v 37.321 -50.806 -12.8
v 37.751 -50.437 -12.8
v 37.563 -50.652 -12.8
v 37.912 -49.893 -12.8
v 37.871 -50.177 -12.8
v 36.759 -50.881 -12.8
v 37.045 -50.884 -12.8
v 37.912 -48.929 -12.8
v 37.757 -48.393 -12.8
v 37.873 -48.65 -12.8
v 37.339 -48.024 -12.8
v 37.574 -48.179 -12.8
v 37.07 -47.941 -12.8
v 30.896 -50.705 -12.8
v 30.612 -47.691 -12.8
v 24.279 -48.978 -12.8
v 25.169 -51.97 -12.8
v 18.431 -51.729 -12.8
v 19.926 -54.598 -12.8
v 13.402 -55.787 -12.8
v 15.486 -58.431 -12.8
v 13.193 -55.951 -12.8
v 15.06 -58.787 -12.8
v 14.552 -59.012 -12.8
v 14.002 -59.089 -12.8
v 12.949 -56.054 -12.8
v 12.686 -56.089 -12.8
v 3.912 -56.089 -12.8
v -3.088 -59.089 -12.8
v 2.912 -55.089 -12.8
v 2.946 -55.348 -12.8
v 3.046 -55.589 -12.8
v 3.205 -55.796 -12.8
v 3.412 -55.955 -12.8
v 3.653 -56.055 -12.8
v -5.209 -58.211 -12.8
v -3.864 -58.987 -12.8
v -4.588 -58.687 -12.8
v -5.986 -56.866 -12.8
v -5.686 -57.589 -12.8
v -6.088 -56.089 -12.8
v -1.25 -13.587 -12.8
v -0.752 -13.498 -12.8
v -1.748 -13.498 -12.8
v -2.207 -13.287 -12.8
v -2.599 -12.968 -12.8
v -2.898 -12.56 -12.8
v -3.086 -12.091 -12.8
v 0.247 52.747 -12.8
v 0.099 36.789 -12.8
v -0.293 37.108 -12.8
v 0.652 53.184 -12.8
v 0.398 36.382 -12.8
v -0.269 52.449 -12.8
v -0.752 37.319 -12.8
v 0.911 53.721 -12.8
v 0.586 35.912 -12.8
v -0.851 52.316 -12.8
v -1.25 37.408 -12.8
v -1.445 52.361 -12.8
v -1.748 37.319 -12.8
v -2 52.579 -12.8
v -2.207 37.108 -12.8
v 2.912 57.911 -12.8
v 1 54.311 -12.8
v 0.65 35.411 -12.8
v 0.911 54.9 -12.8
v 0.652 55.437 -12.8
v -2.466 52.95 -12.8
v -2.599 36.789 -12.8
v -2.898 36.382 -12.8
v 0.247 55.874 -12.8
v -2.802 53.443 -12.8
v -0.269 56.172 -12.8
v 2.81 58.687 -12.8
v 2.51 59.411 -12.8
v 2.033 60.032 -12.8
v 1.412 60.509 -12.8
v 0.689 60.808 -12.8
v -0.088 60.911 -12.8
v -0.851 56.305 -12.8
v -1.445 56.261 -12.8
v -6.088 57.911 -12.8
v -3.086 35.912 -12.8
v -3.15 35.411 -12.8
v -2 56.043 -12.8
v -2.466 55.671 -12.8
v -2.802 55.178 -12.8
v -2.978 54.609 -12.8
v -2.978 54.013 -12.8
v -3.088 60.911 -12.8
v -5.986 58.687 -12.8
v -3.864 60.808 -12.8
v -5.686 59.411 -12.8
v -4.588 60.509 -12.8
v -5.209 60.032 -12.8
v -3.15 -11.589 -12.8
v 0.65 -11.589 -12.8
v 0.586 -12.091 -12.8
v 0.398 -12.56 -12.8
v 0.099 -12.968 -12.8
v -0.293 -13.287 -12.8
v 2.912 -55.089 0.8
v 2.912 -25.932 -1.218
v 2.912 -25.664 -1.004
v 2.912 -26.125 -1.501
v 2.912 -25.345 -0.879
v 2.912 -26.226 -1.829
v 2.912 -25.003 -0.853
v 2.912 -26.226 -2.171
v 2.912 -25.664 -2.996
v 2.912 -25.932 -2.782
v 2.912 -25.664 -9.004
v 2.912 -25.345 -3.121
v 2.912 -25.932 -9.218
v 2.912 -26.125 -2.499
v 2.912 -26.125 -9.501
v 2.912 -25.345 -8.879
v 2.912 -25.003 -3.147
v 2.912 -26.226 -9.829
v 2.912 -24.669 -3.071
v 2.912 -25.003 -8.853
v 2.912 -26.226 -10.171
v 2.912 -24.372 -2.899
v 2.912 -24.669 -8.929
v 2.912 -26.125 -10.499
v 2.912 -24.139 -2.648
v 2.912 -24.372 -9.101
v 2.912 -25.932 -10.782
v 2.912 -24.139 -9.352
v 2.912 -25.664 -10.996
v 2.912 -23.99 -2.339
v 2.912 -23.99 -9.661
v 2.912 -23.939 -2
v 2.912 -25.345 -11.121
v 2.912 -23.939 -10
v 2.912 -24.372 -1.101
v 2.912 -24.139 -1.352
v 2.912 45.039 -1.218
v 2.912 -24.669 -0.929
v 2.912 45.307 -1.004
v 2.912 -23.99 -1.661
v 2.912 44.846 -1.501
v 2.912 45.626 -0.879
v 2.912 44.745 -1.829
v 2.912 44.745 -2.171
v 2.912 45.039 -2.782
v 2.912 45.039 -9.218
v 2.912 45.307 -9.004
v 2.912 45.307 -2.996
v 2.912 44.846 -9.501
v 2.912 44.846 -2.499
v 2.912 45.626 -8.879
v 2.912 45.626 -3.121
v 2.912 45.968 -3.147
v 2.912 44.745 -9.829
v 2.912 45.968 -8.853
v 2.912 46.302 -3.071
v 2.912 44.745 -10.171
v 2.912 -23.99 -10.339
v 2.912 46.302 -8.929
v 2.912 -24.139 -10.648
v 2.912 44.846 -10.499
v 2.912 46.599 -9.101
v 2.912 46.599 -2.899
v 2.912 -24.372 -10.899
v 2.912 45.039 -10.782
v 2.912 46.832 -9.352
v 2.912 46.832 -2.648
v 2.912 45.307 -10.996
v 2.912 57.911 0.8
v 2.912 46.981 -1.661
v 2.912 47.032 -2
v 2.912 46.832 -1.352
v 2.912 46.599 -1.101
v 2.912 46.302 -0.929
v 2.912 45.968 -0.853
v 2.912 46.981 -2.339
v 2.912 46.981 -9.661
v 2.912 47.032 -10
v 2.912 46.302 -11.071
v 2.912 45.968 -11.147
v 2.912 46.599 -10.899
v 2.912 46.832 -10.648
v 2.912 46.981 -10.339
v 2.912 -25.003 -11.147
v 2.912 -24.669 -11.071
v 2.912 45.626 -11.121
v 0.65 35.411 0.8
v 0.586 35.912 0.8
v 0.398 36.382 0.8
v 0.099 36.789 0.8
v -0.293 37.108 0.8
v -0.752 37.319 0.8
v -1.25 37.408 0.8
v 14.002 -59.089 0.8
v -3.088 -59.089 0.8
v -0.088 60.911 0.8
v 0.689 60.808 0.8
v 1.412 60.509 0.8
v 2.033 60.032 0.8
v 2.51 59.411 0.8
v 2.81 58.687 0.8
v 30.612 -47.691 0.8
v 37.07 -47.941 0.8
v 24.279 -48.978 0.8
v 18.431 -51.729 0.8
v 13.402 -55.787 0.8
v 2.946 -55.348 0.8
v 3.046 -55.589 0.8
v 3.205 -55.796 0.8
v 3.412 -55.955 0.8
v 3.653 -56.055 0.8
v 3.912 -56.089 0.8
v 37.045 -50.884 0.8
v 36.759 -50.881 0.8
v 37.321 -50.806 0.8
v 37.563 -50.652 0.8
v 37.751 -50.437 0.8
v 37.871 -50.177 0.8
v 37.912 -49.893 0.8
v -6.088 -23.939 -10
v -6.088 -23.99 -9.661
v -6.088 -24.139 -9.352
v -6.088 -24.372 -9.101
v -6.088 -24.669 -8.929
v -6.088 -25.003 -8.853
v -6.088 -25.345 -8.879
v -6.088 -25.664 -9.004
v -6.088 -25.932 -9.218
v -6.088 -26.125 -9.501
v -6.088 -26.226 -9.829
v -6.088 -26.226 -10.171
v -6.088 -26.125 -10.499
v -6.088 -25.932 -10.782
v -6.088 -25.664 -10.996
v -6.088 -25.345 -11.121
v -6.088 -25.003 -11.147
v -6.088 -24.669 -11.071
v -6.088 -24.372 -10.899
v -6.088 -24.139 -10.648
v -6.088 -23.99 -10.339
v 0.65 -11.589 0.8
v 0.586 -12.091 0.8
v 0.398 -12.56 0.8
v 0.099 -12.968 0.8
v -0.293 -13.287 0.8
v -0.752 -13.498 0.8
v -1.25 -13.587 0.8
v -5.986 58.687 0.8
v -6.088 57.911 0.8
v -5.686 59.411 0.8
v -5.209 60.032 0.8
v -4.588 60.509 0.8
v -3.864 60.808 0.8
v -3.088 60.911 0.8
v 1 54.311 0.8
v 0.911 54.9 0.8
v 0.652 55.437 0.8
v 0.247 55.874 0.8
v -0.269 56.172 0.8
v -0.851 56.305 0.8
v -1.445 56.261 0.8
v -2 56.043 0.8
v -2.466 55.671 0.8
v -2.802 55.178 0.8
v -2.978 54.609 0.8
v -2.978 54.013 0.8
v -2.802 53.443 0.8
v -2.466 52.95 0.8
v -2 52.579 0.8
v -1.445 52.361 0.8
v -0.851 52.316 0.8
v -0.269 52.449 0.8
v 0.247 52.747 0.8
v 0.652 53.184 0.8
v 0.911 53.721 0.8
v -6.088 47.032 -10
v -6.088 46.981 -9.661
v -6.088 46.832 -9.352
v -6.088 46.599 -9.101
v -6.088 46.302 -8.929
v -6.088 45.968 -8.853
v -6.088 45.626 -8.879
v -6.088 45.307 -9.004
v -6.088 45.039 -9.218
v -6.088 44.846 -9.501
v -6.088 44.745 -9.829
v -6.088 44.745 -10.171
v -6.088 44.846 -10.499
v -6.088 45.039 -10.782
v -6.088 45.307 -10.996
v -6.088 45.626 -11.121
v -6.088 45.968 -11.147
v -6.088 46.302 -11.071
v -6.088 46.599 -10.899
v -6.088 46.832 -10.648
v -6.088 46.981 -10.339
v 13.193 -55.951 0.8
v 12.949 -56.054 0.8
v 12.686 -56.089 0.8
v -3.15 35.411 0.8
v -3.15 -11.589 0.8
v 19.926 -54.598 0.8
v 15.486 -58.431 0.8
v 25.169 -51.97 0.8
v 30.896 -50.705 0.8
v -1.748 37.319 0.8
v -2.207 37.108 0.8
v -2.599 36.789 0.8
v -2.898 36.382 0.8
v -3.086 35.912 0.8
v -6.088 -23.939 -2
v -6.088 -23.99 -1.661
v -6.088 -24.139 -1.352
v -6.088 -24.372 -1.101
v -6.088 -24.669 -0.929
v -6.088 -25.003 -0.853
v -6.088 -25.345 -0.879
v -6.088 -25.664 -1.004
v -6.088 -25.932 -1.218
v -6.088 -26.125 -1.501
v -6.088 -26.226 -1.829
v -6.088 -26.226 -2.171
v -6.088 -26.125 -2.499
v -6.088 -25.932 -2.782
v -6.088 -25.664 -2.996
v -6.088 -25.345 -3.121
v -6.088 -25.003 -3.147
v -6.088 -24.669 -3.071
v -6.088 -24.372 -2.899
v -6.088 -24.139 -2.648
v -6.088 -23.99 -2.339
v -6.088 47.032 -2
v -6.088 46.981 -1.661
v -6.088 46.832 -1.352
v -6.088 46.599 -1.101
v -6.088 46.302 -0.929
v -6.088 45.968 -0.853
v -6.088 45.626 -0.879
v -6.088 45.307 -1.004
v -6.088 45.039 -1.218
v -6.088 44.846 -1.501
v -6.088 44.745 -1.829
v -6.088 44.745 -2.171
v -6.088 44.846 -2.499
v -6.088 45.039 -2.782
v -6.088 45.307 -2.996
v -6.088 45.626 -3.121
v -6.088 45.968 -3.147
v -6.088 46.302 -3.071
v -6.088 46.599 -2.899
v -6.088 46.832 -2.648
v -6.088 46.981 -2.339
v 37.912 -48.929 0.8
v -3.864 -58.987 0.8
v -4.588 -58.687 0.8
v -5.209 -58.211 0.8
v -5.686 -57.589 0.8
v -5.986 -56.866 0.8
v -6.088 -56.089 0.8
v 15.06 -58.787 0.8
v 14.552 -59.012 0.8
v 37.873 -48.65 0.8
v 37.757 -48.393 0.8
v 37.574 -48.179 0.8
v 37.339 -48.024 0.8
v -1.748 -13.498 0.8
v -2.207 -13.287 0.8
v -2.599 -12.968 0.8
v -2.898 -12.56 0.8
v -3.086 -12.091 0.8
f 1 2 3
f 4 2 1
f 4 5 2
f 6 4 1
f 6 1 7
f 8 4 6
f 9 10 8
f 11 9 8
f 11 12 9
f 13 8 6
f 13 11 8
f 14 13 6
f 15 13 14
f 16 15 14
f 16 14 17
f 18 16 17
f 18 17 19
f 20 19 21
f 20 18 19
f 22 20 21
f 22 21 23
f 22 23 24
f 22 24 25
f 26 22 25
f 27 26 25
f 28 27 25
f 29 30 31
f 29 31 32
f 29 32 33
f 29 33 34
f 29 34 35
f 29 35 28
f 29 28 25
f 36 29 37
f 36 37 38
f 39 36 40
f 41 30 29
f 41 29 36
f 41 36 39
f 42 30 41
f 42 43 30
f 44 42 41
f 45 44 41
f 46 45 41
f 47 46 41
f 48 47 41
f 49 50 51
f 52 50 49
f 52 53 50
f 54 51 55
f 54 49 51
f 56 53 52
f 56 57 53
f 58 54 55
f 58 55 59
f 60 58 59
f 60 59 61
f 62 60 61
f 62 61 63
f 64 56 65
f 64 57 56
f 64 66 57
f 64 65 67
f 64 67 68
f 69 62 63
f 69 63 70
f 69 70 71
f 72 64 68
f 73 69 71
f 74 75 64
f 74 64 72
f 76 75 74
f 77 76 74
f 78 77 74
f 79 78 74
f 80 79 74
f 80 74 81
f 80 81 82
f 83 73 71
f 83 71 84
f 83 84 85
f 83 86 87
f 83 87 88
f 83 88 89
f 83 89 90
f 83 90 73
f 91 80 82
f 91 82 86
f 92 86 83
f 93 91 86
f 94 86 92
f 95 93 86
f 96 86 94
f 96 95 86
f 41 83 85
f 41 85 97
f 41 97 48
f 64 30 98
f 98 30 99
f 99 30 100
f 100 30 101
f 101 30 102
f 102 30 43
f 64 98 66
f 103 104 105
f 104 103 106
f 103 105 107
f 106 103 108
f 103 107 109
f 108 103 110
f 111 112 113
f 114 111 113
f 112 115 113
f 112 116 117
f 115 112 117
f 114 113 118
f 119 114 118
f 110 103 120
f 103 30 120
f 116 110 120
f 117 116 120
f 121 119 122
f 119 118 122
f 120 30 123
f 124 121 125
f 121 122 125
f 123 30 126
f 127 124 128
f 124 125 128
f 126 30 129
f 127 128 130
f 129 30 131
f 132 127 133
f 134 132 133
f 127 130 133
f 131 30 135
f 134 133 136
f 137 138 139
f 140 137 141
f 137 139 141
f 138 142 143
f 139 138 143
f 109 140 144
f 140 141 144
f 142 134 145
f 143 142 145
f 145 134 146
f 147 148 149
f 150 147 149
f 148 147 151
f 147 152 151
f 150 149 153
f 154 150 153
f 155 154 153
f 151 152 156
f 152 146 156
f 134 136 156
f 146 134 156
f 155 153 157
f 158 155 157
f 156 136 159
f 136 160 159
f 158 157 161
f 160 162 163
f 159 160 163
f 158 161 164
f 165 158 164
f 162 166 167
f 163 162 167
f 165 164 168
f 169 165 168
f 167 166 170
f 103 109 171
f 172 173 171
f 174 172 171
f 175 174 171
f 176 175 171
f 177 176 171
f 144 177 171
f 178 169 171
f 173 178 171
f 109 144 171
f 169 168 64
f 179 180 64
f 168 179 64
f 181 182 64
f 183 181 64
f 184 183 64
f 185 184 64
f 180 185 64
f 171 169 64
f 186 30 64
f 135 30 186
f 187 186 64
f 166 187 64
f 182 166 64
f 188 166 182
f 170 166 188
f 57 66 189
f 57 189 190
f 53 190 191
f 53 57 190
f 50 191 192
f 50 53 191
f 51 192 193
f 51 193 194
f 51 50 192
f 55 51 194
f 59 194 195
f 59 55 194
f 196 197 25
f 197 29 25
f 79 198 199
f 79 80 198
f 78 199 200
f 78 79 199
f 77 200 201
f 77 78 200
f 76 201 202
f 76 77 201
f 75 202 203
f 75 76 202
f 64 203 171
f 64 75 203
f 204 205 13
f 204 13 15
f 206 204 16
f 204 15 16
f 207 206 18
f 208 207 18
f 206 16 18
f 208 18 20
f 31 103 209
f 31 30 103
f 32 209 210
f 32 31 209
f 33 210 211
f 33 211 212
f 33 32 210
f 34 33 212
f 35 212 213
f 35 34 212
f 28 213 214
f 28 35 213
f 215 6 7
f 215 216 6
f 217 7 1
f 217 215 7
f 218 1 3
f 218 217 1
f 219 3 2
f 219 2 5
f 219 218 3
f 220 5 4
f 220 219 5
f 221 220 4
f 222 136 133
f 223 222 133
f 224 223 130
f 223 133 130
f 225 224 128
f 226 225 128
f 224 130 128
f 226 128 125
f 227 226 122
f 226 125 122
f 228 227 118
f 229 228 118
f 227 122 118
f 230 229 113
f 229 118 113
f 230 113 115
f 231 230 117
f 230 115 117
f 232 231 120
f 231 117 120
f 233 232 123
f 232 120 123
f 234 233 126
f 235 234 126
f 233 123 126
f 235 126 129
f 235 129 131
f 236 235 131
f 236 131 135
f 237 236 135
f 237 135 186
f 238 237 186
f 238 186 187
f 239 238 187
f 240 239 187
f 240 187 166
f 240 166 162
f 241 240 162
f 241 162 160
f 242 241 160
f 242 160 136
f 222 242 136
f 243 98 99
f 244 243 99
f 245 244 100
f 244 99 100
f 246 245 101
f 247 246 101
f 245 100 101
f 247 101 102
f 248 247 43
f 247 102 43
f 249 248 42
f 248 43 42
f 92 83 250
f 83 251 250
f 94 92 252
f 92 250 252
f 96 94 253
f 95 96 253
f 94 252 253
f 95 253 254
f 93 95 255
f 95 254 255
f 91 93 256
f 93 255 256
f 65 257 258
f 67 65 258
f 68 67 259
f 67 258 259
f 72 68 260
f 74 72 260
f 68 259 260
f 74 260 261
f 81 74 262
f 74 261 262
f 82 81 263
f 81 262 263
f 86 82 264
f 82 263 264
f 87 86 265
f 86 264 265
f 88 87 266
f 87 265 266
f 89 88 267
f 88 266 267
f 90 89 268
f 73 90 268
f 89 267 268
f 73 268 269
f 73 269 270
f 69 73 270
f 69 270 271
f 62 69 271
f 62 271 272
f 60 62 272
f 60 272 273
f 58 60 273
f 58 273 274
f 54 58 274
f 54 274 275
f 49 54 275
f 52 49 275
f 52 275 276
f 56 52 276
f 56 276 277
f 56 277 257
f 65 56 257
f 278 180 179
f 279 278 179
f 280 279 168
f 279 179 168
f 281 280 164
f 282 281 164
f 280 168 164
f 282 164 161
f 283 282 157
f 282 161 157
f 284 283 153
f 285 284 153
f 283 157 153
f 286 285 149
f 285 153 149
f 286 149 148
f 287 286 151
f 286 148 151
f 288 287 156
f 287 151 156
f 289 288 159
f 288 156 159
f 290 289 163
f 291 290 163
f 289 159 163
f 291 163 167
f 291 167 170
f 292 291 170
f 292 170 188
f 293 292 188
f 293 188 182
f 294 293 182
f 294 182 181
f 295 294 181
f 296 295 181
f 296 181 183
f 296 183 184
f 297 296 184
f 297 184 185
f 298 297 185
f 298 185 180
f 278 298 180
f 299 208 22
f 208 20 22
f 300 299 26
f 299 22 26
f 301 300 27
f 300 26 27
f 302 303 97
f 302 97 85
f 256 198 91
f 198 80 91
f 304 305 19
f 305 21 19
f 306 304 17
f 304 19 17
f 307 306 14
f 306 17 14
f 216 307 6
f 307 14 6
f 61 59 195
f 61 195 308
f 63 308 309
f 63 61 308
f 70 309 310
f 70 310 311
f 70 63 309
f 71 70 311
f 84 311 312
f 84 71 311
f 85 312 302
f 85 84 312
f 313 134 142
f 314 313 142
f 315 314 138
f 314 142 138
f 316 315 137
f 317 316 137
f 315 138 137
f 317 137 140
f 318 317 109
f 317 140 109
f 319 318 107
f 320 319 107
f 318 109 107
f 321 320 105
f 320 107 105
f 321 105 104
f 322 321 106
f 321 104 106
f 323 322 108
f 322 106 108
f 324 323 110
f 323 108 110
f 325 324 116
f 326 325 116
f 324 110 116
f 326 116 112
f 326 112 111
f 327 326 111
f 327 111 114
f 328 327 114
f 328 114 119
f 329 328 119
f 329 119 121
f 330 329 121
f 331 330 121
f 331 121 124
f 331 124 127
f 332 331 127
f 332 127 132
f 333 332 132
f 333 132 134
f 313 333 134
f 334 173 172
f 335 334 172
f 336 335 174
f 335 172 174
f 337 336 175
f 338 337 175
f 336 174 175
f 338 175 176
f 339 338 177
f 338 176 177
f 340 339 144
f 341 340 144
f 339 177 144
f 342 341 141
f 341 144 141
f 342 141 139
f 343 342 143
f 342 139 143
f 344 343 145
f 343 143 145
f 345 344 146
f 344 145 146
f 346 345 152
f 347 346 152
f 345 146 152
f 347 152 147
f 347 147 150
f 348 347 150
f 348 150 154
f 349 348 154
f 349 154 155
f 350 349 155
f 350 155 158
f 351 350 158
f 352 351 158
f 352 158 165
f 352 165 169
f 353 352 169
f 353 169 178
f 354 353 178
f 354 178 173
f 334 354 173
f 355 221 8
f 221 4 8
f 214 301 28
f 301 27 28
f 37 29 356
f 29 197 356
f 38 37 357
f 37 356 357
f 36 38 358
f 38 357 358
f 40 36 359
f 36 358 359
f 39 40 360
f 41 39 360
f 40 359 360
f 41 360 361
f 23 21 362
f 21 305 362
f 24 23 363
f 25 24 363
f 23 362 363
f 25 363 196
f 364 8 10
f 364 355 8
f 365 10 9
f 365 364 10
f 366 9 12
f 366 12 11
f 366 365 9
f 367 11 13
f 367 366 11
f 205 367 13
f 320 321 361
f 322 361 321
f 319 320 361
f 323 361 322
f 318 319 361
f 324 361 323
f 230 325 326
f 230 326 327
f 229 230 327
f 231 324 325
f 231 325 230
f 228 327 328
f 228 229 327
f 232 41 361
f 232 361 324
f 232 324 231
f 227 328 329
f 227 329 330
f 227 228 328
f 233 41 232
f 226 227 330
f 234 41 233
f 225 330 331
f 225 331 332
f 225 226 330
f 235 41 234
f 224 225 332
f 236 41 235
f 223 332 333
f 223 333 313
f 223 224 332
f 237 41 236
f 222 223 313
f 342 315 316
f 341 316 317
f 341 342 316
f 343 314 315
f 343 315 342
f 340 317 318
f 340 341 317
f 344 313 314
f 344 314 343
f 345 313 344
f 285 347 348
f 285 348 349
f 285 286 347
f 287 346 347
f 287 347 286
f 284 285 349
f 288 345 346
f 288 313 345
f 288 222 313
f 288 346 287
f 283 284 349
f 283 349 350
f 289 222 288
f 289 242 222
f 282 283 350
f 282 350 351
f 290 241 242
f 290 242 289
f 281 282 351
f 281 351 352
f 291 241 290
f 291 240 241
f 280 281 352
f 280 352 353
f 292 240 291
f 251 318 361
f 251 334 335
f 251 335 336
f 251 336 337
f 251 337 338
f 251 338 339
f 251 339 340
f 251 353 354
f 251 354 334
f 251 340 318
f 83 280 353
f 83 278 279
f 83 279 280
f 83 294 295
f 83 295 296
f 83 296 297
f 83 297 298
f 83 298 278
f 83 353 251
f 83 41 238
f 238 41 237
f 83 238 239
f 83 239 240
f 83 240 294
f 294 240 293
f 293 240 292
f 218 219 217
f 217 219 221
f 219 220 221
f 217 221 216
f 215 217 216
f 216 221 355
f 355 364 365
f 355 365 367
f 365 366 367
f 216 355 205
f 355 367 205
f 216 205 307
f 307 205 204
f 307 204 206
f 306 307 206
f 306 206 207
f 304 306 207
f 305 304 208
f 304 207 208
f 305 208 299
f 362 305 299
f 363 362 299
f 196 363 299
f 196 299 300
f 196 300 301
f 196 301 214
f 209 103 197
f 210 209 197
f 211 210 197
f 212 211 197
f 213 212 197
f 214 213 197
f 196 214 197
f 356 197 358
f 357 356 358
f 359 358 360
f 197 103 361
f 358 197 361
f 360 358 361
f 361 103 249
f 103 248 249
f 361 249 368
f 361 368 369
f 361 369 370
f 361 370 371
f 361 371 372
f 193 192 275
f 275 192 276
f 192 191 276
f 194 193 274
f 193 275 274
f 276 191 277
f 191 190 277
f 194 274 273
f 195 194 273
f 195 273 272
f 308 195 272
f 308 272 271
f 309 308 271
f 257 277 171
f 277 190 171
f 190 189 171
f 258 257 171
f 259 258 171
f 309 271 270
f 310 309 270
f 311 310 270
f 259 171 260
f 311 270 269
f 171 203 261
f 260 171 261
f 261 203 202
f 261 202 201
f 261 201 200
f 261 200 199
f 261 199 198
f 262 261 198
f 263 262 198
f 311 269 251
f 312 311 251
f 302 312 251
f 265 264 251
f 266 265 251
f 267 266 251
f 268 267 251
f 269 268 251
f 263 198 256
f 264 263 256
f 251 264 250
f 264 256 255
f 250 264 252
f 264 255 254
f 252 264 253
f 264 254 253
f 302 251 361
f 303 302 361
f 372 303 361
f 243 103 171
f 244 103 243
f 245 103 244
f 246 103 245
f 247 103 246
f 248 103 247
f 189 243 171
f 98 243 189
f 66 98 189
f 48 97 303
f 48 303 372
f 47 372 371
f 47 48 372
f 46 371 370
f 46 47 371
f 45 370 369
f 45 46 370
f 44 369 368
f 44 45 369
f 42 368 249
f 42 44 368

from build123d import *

# Parameters (mm, degrees)
F0_W          = 6
F0_H          = 120
F1_DEPTH      = 12.8
F1_DEPTH_BACK = 0.8
F2_R          = 2
F3_R          = 1
F4_R          = 1.15
F5_DEPTH      = 15
F6_W          = 3.8
F6_H          = 51
F6_R          = 2
F7_DEPTH      = 19
F8_R          = 3
F9_T1_DEPTH   = 13.6


# Not quite as in the source:
# - a fillet or chamfer that OpenCascade refuses, or shapes differently, is made with other operations: its cross-section is extruded or revolved along the edge and cut away or added


with BuildPart() as f1:
    # F0 (on Top) → F1 (new body, two sides)
    with BuildSketch(Plane.XY) as f1_sk:
        Polygon((2.9121718865, 60.9107007086), (-0.0878281135, 60.9107007086), (-0.0878281135, -59.0892992914), (2.9121718865, -59.0892992914), (2.9121718865, -56.0892992914), align=None)
        with Locations((-3.0878281135, 0.9107007086)):
            Rectangle(F0_W, F0_H)
        with BuildLine():
            Line((13.1121718865, -56.0892992914), (2.9121718865, -56.0892992914))
            Line((2.9121718865, -56.0892992914), (2.9121718865, -59.0892992914))
            Line((2.9121718865, -59.0892992914), (14.9121718865, -59.0892992914))
            ThreePointArc((14.9121718865, -59.0892992914), (25.3098855946, -51.9202262022), (37.9121718865, -51.0892992914))
            Line((37.9121718865, -51.0892992914), (37.9121718865, -48.0892992914))
            ThreePointArc((37.9121718865, -48.0892992914), (24.4865924683, -48.9100030948), (13.1121718865, -56.0892992914))
        make_face()
    extrude(amount=-F1_DEPTH)
    extrude(f1_sk.sketch, amount=F1_DEPTH_BACK)

    # F2
    f2_edges = [f1.edges().sort_by_distance(p)[0] for p in [
        (14.912172, -59.089299, -6),
    ]]
    fillet(f2_edges, radius=F2_R)

    # F3
    f3_edges = [f1.edges().sort_by_distance(p)[0] for p in [
        (2.912172, -56.089299, -6),
        (13.112172, -56.089299, -6),
        (37.912172, -48.089299, -6),
        (37.912172, -51.089299, -6),
    ]]
    fillet(f3_edges, radius=F3_R)

    # F4 (on face) → F5 (cut)
    with BuildSketch(Plane.YZ.offset(2.9121718865)):
        with Locations((-25.0892992914, -2)):
            Circle(F4_R)
        with Locations((-25.0892992914, -10)):
            Circle(F4_R)
        with Locations((45.8816848695, -2)):
            Circle(F4_R)
        with Locations((45.8816848695, -10)):
            Circle(F4_R)
    extrude(amount=-F5_DEPTH, mode=Mode.SUBTRACT)

    # F6 (on face) → F7 (cut)
    with BuildSketch(Plane.XY.offset(0.8)):
        with Locations((-1.25, 11.9107007086)):
            Rectangle(F6_W, F6_H)
        with Locations((-1, 54.3107017875)):
            Circle(F6_R)
    extrude(amount=-F7_DEPTH, mode=Mode.SUBTRACT)

    # F8
    f8_edges = [f1.edges().sort_by_distance(p)[0] for p in [
        (-6.087828, 60.910701, -6),
        (2.912172, 60.910701, -6),
        (-6.087828, -59.089299, -6),
    ]]
    fillet(f8_edges, radius=F8_R)

    # F9: fillet of radius 2 on 4 edges, made by hand

    # F9_s2 → F9_t1 (join)
    with BuildSketch(Plane.XY.offset(-12.8)):
        with BuildLine():
            ThreePointArc((-1.15, 37.4107007086), (-2.5642135624, 36.824914271), (-3.15, 35.4107007086))
            Line((-3.15, 35.4107007086), (-3.15, 37.4107007086))
            Line((-3.15, 37.4107007086), (-1.15, 37.4107007086))
        make_face()
        with BuildLine():
            ThreePointArc((0.65, 35.4107007086), (0.0642135624, 36.824914271), (-1.35, 37.4107007086))
            Line((-1.35, 37.4107007086), (0.65, 37.4107007086))
            Line((0.65, 37.4107007086), (0.65, 35.4107007086))
        make_face()
        with BuildLine():
            ThreePointArc((-3.15, -11.5892992914), (-2.5642135624, -13.0035128537), (-1.15, -13.5892992914))
            Line((-1.15, -13.5892992914), (-3.15, -13.5892992914))
            Line((-3.15, -13.5892992914), (-3.15, -11.5892992914))
        make_face()
        with BuildLine():
            ThreePointArc((0.65, -11.5892992914), (0.0642135624, -13.0035128537), (-1.35, -13.5892992914))
            Line((-1.35, -13.5892992914), (0.65, -13.5892992914))
            Line((0.65, -13.5892992914), (0.65, -11.5892992914))
        make_face()
    extrude(amount=F9_T1_DEPTH)


solid = f1.part
